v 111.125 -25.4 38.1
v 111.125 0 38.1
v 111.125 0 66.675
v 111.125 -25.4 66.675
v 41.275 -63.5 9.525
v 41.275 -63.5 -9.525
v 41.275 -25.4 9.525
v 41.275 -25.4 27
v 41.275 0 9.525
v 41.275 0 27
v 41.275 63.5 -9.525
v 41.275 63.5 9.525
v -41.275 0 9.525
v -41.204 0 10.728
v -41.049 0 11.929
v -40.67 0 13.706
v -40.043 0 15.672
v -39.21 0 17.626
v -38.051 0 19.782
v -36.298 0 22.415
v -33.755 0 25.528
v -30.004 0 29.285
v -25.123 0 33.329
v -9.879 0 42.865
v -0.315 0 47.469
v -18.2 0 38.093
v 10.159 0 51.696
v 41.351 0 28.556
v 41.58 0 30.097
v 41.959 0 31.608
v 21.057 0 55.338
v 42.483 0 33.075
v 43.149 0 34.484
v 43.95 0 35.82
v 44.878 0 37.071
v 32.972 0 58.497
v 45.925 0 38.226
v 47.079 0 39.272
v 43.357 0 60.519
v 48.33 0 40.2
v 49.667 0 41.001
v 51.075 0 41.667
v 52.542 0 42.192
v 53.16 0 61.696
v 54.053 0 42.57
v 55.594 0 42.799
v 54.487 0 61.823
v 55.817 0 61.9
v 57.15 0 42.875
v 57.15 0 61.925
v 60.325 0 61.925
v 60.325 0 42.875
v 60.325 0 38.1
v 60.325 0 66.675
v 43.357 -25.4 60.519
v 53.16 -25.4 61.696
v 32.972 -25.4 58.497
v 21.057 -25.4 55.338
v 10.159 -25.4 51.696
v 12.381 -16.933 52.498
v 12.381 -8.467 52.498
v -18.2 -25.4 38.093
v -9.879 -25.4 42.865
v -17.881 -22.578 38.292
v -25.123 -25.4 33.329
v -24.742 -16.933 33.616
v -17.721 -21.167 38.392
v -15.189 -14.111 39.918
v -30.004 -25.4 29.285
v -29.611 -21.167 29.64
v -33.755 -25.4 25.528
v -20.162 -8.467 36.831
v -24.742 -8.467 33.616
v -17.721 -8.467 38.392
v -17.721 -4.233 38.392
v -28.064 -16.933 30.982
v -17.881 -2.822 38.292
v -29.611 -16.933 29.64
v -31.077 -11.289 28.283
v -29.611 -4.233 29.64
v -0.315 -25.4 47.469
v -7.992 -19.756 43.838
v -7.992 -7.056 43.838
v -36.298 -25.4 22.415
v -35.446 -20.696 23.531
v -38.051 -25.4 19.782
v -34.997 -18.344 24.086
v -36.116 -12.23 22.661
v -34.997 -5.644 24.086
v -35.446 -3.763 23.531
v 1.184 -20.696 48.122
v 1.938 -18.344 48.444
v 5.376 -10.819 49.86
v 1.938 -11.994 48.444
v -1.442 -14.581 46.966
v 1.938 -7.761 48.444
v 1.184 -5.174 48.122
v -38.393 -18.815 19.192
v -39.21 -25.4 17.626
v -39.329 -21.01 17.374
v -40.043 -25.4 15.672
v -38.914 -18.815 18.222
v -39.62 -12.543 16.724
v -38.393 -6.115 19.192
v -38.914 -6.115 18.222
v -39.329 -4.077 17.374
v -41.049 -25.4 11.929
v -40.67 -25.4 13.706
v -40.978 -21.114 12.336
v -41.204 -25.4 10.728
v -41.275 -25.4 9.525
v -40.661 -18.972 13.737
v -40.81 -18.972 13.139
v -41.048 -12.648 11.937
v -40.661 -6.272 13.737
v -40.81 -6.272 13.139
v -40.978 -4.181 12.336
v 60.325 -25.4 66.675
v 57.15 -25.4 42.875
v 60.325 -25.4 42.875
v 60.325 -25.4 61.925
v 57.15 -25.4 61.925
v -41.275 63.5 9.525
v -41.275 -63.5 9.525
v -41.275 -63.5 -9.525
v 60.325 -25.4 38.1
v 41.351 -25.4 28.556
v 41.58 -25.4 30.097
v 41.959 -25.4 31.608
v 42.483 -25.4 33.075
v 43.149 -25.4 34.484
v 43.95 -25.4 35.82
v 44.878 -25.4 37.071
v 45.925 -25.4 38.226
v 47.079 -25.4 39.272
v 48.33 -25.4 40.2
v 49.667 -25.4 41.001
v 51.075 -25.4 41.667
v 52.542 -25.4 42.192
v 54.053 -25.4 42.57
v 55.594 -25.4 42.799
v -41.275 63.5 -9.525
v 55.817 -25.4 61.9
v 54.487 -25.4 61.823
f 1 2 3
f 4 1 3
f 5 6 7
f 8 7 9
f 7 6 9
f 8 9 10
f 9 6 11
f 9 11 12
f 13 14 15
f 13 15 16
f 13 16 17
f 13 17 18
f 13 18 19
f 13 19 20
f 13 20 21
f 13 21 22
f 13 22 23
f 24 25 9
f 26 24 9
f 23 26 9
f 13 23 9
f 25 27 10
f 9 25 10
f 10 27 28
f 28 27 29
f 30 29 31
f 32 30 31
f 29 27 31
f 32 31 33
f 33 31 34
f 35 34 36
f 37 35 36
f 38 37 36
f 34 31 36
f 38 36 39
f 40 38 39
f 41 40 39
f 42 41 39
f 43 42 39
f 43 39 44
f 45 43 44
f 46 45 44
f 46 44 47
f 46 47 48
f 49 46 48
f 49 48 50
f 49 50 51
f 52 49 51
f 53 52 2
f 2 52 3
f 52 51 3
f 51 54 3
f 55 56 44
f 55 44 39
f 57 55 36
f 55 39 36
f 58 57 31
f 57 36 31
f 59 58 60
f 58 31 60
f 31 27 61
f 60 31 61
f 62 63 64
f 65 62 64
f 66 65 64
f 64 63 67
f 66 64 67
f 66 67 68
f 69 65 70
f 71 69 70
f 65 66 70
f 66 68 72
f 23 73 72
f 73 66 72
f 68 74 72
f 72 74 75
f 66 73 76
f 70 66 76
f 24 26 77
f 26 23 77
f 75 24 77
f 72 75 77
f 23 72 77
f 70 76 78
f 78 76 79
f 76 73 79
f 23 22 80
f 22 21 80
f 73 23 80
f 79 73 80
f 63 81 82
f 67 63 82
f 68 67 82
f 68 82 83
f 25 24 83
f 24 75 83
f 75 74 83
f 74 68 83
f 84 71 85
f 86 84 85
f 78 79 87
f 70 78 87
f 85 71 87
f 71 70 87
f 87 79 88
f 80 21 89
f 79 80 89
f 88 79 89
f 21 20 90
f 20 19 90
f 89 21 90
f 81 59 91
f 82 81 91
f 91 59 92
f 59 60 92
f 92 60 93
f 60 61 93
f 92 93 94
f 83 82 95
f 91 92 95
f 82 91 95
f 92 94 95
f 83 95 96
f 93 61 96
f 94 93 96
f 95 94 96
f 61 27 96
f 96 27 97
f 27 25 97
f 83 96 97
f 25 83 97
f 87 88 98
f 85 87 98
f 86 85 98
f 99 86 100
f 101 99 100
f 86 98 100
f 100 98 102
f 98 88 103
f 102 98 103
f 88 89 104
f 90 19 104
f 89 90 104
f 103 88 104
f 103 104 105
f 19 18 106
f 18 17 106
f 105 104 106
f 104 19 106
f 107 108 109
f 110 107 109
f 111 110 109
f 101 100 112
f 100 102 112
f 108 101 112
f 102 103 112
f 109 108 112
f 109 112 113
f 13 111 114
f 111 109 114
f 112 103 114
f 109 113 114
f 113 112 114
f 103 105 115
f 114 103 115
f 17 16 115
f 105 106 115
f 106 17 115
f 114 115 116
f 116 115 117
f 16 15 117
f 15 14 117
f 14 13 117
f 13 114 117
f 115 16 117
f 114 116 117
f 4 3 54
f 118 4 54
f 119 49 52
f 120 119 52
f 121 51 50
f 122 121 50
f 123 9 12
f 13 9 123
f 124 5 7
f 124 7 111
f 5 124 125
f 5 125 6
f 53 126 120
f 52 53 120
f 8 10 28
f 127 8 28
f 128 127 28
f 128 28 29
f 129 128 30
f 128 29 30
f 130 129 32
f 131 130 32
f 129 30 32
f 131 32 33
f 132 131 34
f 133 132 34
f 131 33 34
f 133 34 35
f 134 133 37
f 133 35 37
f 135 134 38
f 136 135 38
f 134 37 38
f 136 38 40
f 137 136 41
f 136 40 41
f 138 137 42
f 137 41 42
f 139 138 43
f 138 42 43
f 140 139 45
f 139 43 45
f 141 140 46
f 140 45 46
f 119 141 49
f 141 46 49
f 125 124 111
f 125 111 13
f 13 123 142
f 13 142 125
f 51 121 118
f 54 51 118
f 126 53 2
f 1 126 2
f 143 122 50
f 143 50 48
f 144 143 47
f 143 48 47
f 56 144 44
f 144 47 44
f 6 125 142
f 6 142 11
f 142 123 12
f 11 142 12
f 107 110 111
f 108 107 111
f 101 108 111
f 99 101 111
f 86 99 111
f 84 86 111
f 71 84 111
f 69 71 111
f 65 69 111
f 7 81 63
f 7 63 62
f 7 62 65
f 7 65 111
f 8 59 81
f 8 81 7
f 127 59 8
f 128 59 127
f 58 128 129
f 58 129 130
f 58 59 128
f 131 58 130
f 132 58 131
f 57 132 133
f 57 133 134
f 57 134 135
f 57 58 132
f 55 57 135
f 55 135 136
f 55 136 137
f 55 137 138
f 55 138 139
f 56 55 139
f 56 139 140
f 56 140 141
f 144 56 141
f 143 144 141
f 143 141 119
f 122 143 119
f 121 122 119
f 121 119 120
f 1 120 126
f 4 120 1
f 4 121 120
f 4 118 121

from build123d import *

# Parameters (mm, degrees)
F1_DEPTH = 63.5
F0_W     = 25.4
F0_H     = 19.05
F0_H_2   = 4.7498
F0_H_3   = 4.7752
F2_DEPTH = 25.4


with BuildPart() as f1:
    # F0 (on Front) → F1 (new body, symmetric)
    with BuildSketch(Plane.XZ):
        Polygon((22.225, 9.525), (-41.275, 9.525), (-41.275, -9.525), (41.275, -9.525), (41.275, 9.525), align=None)
    extrude(amount=F1_DEPTH, both=True)

    # F0 (on Front) → F2 (join)
    with BuildSketch(Plane.XZ):
        with BuildLine():
            add(Edge.make_bspline(
                [(53.1596094472, 61.6964881046), (16.1985409417, 58.8323622572), (-40.681488346, 34.7288044556), (-41.275, 9.525)],
                knots=[3.9524583094, 3.9524583094, 3.9524583094, 3.9524583094, 111.5045361635, 111.5045361635, 111.5045361635, 111.5045361635], degree=3))
            Line((-41.275, 9.525), (22.225, 9.525))
            Line((22.225, 9.525), (22.225, 27.0002))
            ThreePointArc((22.225, 27.0002), (31.0816282149, 50.242308714), (53.1596094472, 61.6964881046))
        make_face()
        Polygon((22.225, 9.525), (-41.275, 9.525), (-41.275, -9.525), (41.275, -9.525), (41.275, 9.525), align=None)
        with BuildLine():
            Line((22.225, 27.0002), (22.225, 9.525))
            Line((22.225, 9.525), (41.275, 9.525))
            Line((41.275, 9.525), (41.275, 27.0002))
            ThreePointArc((41.275, 27.0002), (45.9246798487, 38.2255201513), (57.15, 42.8752))
            Line((57.15, 42.8752), (60.325, 42.8752))
            Line((60.325, 42.8752), (60.325, 61.9252))
            Line((60.325, 61.9252), (57.15, 61.9252))
            add(Edge.make_bspline(
                [(57.15, 61.9252), (55.849291913, 61.878313053), (54.5179010326, 61.8017425844), (53.1596094472, 61.6964881046)],
                knots=[0, 0, 0, 0, 3.9524583094, 3.9524583094, 3.9524583094, 3.9524583094], degree=3))
            ThreePointArc((53.1596094472, 61.6964881046), (31.0816282149, 50.242308714), (22.225, 27.0002))
        make_face()
        with BuildLine():
            ThreePointArc((57.15, 61.9252), (55.151530217, 61.8679751445), (53.1596094472, 61.6964881046))
            add(Edge.make_bspline(
                [(57.15, 61.9252), (55.849291913, 61.878313053), (54.5179010326, 61.8017425844), (53.1596094472, 61.6964881046)],
                knots=[0, 0, 0, 0, 3.9524583094, 3.9524583094, 3.9524583094, 3.9524583094], degree=3))
        make_face()
        with Locations((73.025, 52.4002)):
            Rectangle(F0_W, F0_H)
        with Locations((73.025, 64.3001)):
            Rectangle(F0_W, F0_H_2)
        with Locations((73.025, 40.4876)):
            Rectangle(F0_W, F0_H_3)
        Polygon((85.725, 66.675), (85.725, 61.9252), (85.725, 42.8752), (85.725, 38.1), (111.125, 38.1), (111.125, 66.675), align=None)
    extrude(amount=F2_DEPTH)


solid = f1.part
